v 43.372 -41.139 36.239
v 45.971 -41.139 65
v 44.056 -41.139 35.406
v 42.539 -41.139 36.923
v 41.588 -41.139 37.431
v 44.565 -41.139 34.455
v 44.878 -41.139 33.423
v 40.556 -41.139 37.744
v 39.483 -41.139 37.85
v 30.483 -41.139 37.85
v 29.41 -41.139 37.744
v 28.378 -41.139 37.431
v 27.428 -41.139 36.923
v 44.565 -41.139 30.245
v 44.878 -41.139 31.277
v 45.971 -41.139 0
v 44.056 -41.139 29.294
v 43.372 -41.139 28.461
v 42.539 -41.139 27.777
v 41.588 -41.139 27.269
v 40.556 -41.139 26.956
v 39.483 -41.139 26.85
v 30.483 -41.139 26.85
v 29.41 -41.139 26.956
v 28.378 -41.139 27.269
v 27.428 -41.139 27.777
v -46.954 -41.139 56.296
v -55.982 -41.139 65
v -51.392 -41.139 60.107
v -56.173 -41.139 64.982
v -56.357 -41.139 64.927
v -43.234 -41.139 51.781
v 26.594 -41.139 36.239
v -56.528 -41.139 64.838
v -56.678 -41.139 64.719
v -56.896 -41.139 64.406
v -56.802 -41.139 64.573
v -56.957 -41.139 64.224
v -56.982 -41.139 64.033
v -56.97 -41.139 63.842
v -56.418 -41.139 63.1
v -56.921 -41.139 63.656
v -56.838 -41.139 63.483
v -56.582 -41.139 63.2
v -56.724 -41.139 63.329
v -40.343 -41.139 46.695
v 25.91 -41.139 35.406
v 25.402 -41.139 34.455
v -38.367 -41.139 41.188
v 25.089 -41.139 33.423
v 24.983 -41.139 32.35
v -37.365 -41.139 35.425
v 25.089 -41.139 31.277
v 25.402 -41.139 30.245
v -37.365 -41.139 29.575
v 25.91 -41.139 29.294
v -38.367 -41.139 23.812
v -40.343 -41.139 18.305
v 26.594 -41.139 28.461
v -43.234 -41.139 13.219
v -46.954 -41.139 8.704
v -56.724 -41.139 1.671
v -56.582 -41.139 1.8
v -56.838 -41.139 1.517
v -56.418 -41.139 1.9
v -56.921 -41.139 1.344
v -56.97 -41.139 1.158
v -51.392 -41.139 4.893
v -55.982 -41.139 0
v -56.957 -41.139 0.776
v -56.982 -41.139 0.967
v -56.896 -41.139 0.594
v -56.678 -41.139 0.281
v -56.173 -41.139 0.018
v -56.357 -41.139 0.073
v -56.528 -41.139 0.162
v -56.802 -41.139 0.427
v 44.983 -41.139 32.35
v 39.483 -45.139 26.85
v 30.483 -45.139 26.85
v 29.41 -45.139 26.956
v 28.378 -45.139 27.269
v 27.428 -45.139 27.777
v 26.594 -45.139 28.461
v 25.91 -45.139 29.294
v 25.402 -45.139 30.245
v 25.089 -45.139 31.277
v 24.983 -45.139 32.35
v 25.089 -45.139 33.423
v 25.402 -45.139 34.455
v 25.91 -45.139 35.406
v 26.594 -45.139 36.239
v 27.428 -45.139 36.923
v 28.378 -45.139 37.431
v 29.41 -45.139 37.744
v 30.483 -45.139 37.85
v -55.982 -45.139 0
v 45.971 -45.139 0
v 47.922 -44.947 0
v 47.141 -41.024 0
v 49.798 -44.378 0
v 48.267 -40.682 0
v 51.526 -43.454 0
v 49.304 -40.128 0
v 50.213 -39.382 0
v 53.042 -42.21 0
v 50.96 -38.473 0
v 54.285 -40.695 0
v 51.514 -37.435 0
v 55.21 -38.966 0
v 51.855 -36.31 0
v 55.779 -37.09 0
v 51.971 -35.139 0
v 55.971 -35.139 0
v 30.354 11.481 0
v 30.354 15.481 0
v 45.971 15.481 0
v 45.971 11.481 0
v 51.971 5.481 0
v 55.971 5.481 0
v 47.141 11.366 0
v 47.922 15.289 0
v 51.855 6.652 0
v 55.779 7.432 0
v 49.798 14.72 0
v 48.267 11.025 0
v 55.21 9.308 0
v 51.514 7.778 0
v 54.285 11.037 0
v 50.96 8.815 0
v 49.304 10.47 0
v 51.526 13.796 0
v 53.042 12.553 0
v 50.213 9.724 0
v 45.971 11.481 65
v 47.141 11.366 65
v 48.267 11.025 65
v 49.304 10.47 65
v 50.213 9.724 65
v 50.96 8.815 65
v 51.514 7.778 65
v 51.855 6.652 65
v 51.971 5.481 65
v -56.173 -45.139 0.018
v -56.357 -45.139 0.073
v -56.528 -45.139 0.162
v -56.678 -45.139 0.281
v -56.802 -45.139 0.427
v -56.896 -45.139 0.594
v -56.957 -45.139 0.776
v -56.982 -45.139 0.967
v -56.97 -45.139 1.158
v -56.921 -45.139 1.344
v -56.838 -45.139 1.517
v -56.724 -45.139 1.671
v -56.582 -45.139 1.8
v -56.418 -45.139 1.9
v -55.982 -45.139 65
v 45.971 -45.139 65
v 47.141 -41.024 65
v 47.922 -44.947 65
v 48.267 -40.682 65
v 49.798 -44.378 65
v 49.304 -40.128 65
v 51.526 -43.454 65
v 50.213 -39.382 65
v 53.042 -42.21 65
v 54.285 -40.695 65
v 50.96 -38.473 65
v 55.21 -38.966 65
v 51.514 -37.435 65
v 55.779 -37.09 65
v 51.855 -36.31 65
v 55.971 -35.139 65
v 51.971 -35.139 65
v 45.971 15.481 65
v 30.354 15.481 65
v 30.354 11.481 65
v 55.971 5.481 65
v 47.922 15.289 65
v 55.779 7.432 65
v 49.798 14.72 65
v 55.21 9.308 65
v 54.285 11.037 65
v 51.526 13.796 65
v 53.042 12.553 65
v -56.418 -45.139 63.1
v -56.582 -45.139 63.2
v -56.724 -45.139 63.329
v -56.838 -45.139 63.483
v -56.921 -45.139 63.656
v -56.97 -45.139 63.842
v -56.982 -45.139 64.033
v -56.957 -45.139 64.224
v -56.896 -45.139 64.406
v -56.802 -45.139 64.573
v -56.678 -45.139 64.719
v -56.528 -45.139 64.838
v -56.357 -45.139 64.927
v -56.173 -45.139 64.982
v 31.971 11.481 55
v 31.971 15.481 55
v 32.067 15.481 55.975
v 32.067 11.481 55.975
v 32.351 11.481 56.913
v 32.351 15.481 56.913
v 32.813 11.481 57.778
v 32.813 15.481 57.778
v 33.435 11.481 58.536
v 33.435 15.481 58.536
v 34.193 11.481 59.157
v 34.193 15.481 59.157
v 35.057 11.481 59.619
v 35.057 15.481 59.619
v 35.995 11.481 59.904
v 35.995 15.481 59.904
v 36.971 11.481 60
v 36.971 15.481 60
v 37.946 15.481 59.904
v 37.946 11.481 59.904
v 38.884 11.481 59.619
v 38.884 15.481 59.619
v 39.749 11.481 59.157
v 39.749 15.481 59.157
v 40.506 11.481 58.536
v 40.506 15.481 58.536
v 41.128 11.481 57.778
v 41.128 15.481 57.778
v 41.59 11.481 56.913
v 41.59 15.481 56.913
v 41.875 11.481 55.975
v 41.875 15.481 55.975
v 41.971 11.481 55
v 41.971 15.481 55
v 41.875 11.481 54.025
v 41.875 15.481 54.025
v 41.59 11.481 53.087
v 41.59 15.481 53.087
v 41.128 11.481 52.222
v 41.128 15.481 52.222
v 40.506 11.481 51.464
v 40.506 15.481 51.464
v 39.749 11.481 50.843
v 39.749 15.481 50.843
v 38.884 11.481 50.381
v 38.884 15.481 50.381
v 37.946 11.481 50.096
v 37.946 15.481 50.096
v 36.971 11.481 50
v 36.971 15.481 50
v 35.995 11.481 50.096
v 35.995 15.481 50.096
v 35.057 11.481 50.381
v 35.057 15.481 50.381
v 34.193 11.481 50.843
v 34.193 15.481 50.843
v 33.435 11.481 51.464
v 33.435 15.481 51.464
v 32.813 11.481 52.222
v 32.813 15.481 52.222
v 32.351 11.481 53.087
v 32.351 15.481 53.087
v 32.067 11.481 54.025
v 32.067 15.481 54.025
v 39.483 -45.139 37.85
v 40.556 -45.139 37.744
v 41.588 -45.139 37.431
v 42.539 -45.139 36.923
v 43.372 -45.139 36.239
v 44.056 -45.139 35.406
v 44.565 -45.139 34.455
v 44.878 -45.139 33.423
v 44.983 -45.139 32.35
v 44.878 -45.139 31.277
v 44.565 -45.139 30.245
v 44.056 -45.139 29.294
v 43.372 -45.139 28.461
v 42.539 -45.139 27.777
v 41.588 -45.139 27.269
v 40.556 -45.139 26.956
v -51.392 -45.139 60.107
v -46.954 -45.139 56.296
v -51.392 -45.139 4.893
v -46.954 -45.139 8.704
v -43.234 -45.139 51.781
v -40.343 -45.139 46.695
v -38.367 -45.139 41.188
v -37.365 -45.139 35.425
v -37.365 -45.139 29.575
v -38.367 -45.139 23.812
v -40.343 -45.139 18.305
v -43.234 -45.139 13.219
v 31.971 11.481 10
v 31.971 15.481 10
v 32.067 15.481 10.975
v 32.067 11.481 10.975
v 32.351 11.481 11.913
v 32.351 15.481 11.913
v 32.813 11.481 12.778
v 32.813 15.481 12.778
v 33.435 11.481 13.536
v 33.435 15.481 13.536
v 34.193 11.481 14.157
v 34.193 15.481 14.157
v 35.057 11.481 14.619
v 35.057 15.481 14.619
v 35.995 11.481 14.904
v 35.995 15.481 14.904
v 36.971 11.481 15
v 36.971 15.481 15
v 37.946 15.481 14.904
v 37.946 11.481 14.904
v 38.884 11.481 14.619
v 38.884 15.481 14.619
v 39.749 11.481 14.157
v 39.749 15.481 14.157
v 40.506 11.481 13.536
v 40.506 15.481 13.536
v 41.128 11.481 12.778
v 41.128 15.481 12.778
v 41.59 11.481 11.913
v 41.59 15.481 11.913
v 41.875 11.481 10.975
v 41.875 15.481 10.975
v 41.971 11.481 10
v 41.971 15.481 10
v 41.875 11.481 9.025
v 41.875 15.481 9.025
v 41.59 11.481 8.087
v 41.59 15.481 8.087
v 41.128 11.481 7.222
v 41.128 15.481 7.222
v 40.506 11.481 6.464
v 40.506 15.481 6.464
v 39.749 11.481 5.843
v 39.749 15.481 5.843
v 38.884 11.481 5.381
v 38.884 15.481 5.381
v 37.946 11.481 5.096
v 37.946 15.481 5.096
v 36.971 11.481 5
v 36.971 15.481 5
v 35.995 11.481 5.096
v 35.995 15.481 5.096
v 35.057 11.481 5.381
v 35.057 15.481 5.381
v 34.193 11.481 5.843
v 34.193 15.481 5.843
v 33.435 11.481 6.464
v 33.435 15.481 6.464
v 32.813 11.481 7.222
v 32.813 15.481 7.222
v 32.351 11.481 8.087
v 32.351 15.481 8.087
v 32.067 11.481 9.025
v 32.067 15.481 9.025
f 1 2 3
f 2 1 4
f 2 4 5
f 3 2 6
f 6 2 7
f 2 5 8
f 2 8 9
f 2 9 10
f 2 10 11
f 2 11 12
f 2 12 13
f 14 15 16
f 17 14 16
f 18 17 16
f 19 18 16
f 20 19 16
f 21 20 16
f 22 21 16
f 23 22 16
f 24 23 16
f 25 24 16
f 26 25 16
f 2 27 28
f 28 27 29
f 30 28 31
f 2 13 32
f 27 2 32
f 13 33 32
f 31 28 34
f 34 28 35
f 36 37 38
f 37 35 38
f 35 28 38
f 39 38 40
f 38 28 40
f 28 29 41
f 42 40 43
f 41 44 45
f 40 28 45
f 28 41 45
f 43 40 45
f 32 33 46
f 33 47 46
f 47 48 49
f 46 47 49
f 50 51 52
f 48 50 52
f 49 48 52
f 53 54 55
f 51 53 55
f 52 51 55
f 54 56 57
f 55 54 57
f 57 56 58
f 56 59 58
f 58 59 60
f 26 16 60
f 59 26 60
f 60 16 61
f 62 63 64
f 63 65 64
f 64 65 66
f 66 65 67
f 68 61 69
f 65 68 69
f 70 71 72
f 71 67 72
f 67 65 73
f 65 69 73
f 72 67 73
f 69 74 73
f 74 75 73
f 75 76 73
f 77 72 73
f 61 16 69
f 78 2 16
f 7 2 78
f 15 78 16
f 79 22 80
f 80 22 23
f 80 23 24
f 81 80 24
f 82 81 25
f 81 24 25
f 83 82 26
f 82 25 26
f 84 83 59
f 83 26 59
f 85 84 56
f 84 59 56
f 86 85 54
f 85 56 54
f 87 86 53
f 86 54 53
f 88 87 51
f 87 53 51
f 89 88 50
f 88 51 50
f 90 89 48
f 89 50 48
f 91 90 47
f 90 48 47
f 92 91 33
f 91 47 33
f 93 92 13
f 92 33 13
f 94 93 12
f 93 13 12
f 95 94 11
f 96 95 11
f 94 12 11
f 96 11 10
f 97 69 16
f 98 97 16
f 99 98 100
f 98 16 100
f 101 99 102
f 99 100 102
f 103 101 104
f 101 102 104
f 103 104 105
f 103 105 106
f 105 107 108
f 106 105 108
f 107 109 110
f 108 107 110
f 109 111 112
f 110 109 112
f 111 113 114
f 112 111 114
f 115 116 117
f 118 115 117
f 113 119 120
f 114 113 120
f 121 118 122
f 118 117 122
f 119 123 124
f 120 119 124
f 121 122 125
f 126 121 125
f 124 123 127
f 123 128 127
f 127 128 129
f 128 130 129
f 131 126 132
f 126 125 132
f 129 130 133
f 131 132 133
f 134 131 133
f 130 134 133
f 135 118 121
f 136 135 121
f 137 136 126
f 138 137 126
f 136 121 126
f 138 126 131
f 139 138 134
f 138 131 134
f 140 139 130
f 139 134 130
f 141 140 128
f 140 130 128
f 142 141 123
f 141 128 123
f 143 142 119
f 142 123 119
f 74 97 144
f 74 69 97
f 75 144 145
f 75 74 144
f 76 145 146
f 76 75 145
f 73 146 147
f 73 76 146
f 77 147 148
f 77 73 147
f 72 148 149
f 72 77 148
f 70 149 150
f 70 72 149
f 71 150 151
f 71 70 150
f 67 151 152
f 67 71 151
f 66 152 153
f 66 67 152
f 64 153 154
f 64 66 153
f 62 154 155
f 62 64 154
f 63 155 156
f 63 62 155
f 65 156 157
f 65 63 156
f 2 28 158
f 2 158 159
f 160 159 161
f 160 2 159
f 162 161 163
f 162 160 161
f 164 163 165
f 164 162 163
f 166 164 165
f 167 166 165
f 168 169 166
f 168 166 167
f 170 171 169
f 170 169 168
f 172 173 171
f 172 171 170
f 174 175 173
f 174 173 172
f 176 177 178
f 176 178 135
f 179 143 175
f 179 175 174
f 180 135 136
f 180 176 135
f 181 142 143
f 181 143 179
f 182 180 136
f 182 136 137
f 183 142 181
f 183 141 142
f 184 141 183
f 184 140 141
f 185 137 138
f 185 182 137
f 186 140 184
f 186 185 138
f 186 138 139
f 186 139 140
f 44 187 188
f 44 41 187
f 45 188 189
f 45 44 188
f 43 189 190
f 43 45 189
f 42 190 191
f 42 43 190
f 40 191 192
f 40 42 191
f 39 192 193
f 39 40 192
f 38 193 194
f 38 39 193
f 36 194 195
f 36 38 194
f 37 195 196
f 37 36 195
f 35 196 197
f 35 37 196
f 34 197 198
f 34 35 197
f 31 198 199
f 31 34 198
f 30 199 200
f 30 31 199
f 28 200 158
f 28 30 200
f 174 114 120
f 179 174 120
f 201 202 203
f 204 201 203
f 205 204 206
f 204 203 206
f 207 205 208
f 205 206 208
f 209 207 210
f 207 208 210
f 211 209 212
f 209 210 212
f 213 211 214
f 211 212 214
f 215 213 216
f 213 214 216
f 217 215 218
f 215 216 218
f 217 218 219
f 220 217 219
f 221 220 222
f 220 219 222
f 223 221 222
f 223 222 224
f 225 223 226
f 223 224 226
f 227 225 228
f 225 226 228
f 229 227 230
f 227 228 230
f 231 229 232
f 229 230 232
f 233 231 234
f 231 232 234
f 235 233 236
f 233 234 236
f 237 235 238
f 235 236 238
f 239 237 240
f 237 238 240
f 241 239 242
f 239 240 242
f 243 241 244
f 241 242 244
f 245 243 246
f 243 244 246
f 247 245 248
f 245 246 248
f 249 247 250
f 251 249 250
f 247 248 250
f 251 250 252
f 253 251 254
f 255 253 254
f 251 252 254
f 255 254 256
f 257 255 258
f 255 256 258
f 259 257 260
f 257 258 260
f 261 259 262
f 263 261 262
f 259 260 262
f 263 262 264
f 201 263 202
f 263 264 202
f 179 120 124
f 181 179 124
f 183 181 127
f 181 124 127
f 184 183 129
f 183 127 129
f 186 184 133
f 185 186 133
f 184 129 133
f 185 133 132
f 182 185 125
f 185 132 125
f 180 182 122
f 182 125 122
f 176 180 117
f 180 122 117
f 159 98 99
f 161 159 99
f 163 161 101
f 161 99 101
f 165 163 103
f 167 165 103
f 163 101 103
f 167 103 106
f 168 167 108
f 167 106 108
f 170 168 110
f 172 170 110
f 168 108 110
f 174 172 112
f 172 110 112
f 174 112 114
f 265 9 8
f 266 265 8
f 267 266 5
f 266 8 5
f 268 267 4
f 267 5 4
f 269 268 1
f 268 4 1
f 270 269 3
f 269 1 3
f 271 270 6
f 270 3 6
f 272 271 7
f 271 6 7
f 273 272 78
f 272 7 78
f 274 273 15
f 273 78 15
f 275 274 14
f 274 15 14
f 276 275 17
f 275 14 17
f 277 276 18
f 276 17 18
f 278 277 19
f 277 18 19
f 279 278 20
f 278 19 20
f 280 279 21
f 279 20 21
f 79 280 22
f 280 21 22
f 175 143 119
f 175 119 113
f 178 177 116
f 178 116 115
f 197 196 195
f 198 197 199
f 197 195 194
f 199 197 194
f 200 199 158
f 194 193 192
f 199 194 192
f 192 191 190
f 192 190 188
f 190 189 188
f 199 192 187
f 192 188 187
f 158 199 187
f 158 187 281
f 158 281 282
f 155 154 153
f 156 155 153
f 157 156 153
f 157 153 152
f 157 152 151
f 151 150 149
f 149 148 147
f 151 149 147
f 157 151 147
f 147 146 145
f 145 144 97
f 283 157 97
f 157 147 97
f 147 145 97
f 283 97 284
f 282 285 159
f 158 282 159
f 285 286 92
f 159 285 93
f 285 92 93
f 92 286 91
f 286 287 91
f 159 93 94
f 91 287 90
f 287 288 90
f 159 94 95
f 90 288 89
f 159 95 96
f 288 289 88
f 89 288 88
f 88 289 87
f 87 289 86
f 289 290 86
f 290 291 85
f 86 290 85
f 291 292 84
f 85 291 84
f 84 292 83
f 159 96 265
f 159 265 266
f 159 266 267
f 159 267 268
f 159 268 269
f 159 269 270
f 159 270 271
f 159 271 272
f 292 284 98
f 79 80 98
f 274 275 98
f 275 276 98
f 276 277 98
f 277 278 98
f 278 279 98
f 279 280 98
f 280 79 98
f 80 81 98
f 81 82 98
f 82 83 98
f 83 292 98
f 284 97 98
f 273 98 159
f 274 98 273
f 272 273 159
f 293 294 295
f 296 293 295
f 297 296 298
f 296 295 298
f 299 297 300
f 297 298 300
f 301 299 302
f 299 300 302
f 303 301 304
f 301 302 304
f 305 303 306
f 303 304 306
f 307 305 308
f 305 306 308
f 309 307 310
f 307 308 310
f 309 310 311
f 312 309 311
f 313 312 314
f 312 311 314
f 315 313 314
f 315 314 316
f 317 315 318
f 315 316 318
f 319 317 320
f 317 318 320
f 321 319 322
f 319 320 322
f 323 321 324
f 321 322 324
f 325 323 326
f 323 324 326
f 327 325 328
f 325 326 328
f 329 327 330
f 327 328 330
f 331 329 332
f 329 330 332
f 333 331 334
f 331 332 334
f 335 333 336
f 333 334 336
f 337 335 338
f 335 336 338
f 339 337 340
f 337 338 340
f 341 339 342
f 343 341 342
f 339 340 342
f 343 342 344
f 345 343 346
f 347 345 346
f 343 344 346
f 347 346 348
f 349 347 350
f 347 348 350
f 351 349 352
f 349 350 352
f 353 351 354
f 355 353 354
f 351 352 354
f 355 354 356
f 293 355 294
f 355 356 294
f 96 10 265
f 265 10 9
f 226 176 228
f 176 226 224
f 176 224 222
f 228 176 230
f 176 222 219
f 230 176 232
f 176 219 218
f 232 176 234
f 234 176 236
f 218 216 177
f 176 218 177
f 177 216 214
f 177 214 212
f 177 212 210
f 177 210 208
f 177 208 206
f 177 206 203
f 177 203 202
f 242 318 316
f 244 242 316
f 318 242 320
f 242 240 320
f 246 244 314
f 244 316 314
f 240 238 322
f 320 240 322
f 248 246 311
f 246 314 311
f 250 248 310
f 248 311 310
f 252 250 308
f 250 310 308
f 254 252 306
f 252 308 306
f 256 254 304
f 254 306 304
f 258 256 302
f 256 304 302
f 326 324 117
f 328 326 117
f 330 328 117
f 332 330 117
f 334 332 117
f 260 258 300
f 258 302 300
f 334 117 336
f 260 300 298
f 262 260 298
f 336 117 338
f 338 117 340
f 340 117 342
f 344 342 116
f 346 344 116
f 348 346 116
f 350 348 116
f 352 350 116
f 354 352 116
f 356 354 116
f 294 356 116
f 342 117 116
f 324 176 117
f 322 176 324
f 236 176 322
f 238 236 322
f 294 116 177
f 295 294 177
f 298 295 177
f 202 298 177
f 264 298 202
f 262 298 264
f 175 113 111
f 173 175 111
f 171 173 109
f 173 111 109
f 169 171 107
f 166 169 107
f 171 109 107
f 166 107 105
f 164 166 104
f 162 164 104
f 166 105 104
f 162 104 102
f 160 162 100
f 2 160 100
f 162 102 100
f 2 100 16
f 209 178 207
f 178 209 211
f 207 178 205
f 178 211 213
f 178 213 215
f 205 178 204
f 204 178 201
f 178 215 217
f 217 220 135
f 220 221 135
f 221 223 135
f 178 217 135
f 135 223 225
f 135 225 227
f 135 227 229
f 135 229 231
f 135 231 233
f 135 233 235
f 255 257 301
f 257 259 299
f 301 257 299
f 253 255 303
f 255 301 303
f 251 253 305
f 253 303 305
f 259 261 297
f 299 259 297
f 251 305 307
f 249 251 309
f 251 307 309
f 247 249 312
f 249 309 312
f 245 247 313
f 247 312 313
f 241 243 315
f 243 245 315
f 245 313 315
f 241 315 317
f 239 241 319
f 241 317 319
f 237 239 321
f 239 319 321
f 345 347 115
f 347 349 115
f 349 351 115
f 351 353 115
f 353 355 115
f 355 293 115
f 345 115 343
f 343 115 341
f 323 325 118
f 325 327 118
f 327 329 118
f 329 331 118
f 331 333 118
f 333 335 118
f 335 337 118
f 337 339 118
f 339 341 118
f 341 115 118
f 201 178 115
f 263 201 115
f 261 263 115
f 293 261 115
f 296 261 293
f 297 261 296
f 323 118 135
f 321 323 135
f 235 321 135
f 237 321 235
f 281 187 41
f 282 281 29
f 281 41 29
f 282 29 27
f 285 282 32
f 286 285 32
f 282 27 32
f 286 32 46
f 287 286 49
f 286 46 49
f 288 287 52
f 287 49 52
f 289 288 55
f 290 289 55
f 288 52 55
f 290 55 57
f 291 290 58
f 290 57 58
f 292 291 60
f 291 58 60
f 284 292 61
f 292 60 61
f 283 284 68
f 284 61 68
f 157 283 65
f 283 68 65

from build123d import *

# Parameters (mm, degrees)
F1_DEPTH  = 65
F3_R      = 5
F4_DEPTH  = 4
F7_DEPTH  = 25
F8_R      = 1
F10_DEPTH = 4.001


with BuildPart() as f1:
    # F0 (on Top) → F1 (new body)
    with BuildSketch(Plane.XY):
        with BuildLine():
            Line((-71.158341, -41.139144), (-71.158341, -45.139144))
            Line((-71.158341, -45.139144), (45.970776, -45.139144))
            ThreePointArc((45.970776, -45.139144), (53.041844, -42.210212), (55.970776, -35.139144))
            Line((55.970776, -35.139144), (55.970776, 5.481472))
            ThreePointArc((55.970776, 5.481472), (53.041844, 12.552539), (45.970776, 15.481472))
            Line((45.970776, 15.481472), (30.353561, 15.481472))
            Line((30.353561, 15.481472), (30.353561, 11.481472))
            Line((30.353561, 11.481472), (45.970776, 11.481472))
            ThreePointArc((45.970776, 11.481472), (50.213417, 9.724112), (51.970776, 5.481472))
            Line((51.970776, 5.481472), (51.970776, -35.139144))
            ThreePointArc((51.970776, -35.139144), (50.213417, -39.381785), (45.970776, -41.139144))
            Line((45.970776, -41.139144), (-71.158341, -41.139144))
        make_face()
    extrude(amount=F1_DEPTH)

    # F3 (on face) → F4 (cut)
    with BuildSketch(Plane(origin=(0, 15.481472, 0), x_dir=(-1, 0, 0), z_dir=(0, 1, 0))):
        with Locations((-36.970776, 10)):
            Circle(F3_R)
        with Locations((-36.970776, 55)):
            Circle(F3_R)
    extrude(amount=-F4_DEPTH, mode=Mode.SUBTRACT)

    # F6 (on face) → F7 (cut)
    with BuildSketch(Plane(origin=(0, -41.139144, 0), x_dir=(-1, 0, 0), z_dir=(0, 1, 0))):
        with BuildLine():
            Line((78.911833, 65.031889), (61.355465, 65.031889))
            ThreePointArc((61.355465, 65.031889), (37.238592, 32.5), (61.355465, -0.031889))
            Line((61.355465, -0.031889), (78.911833, -0.031889))
            Line((78.911833, -0.031889), (78.911833, 65.031889))
        make_face()
    extrude(amount=-F7_DEPTH, mode=Mode.SUBTRACT)

    # F8
    f8_edges = [f1.edges().sort_by_distance(p)[0] for p in [
        (-61.2511, -43.139144, 65),
        (-61.2511, -43.139144, 0),
    ]]
    fillet(f8_edges, radius=F8_R)

    # F9 (on face) → F10 (cut, through all)
    with BuildSketch(Plane(origin=(0, -41.139144, 0), x_dir=(-1, 0, 0), z_dir=(0, 1, 0))):
        with BuildLine():
            Line((-39.483187, 26.849984), (-30.483187, 26.849984))
            ThreePointArc((-30.483187, 26.849984), (-24.983187, 32.349983), (-30.483186, 37.849984))
            Line((-30.483186, 37.849984), (-39.483187, 37.849984))
            ThreePointArc((-39.483187, 37.849984), (-44.983187, 32.349984), (-39.483187, 26.849984))
        make_face()
    extrude(amount=-F10_DEPTH, mode=Mode.SUBTRACT)


solid = f1.part
